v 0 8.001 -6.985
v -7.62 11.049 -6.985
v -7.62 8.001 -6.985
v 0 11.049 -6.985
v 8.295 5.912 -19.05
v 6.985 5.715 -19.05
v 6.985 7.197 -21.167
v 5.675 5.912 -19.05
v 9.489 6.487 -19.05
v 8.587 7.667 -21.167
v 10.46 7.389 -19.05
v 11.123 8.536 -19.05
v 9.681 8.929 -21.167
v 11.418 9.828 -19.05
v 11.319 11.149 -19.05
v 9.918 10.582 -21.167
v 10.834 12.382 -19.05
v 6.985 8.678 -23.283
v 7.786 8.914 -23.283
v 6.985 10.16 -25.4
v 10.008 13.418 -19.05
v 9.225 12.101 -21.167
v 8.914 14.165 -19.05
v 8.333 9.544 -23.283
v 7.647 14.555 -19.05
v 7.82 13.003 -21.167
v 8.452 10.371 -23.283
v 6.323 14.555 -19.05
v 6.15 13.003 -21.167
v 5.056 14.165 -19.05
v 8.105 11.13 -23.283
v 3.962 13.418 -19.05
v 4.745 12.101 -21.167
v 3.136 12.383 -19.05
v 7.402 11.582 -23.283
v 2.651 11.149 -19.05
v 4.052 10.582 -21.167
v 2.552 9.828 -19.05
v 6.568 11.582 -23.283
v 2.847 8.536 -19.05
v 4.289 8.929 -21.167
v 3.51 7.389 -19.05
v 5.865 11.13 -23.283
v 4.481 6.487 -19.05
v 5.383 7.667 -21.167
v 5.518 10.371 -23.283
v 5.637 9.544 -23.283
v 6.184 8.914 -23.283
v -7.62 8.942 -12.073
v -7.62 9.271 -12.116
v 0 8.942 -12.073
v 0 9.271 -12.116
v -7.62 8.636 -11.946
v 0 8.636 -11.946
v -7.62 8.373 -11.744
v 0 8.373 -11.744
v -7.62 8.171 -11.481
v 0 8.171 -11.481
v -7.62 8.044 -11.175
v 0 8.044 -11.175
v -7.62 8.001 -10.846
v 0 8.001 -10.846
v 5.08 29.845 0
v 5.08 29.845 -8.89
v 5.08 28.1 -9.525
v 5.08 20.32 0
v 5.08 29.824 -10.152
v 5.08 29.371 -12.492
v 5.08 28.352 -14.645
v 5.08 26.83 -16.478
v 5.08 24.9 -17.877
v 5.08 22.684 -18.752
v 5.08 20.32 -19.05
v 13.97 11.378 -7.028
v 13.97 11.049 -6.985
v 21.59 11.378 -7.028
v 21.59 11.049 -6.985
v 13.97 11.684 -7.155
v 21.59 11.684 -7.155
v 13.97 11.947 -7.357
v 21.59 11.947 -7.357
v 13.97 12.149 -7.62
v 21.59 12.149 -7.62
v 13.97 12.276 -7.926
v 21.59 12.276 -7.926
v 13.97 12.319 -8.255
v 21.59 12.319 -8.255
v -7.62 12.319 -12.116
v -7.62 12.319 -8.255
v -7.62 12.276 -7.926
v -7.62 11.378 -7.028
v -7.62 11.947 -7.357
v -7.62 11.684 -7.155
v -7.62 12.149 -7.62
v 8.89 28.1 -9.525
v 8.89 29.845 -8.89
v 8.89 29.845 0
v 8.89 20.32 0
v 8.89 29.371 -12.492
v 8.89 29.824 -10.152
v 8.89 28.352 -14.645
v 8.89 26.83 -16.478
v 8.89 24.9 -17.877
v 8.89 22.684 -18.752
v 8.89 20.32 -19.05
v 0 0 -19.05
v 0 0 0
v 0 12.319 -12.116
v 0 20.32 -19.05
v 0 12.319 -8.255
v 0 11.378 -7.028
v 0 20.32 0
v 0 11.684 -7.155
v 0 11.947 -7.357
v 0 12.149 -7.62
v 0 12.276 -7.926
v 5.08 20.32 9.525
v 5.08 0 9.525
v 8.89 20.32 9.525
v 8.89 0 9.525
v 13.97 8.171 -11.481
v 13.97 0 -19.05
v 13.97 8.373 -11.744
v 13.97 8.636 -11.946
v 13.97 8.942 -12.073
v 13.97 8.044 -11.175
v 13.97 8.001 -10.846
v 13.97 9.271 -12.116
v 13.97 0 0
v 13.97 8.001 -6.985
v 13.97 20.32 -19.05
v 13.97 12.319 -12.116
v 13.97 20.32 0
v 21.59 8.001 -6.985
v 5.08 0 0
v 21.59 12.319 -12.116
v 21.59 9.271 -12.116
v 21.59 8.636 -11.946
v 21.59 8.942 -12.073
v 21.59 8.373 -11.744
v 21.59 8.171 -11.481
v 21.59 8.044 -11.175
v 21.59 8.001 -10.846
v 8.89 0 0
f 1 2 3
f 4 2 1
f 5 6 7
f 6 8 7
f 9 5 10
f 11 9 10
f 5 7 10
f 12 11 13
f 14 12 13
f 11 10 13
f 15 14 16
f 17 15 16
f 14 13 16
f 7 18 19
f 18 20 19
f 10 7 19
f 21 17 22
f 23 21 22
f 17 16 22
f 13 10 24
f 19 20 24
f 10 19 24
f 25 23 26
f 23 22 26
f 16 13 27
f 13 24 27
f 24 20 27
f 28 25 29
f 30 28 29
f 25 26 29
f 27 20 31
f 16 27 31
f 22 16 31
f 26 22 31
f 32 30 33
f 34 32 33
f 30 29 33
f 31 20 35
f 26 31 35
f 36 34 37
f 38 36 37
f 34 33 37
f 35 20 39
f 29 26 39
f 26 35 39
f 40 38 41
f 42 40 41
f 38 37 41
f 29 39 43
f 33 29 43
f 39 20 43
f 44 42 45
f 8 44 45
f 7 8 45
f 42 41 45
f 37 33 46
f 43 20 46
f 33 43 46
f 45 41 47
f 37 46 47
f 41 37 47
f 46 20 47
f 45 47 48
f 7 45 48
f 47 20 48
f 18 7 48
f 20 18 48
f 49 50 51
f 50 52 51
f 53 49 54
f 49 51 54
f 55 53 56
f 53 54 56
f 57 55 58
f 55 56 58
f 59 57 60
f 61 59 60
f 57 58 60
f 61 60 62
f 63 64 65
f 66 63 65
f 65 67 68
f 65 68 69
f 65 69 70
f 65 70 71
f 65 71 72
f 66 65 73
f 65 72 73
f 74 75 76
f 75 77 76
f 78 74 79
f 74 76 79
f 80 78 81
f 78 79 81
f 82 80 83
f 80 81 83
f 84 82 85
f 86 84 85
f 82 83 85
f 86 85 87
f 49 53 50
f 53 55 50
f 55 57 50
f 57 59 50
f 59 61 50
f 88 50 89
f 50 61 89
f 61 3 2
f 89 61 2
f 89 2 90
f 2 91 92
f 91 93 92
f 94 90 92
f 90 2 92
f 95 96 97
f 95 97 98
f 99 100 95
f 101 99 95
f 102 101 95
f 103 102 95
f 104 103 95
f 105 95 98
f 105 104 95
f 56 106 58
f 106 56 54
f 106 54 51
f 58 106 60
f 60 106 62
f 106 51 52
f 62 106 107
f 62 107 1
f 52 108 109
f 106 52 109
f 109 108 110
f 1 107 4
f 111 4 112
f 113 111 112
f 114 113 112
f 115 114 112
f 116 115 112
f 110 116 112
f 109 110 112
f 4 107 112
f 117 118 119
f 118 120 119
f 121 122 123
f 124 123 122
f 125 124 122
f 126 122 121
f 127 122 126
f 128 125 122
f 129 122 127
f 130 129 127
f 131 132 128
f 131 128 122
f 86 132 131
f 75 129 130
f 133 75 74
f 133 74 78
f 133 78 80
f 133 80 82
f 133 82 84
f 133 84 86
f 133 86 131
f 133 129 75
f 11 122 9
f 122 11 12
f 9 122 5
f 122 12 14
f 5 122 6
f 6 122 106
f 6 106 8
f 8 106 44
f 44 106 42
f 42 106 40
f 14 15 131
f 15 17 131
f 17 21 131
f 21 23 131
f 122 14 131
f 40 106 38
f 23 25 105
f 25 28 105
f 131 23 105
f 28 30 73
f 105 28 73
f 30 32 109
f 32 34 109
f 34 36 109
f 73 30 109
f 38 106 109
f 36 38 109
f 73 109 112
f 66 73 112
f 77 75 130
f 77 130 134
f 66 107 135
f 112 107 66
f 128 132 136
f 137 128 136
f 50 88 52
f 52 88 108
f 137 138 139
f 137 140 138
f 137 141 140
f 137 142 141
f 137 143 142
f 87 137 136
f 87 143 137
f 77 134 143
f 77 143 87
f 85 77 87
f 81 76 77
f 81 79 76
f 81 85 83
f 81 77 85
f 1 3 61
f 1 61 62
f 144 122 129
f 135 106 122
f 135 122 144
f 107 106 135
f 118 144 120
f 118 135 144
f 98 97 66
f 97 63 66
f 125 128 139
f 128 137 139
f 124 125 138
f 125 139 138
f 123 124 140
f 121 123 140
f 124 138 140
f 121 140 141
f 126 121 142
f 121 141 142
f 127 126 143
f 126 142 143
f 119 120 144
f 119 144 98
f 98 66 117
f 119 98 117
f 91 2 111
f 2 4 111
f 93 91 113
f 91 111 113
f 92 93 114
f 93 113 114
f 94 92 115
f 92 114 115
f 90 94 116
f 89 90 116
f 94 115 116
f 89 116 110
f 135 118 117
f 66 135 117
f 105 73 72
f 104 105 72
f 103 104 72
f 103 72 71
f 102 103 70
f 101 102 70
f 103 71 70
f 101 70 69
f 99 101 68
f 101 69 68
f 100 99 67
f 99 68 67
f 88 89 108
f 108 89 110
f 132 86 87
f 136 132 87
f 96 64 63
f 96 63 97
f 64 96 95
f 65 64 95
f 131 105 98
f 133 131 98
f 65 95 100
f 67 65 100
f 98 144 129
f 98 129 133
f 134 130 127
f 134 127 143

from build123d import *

# Parameters (mm, degrees)
F0_W      = 20.32
F0_H      = 19.05
F1_DEPTH  = 13.97
F3_START  = -6.985
F2_W      = 29.21
F2_H      = 4.318
F3_DEPTH  = 5.1308
F7_W      = 20.32
F7_H      = 9.525
F8_DEPTH  = 1.905
F9_DEPTH  = 9.525
F10_R     = 1.27
F12_DEPTH = 25.4


with BuildPart() as f1:
    # F0 (on Right) → F1 (new body)
    with BuildSketch(Plane.YZ):
        with Locations((10.16, -9.525)):
            Rectangle(F0_W, F0_H)
    extrude(amount=F1_DEPTH)

    # F2 (on face) → F3 (join)
    with BuildSketch(Plane.XY.offset(F3_START)):
        with Locations((6.985, 10.16)):
            Rectangle(F2_W, F2_H)
    extrude(amount=-F3_DEPTH)

    # F5 (on offset) → F6 (revolve)
    with BuildSketch(Plane.YZ.offset(6.985)):
        Polygon((10.16, -19.05), (5.715, -19.05), (10.16, -25.4), align=None)
    revolve(axis=Axis((6.985, 10.16, -22.225), (0, 0, 1)))

    # F7 (on offset) → F8 (join, symmetric)
    with BuildSketch(Plane.YZ.offset(6.985)):
        with BuildLine():
            ThreePointArc((20.32, -19.05), (27.0551920908, -16.2601920908), (29.845, -9.525))
            Line((29.845, -9.525), (20.32, -9.525))
            Line((20.32, -9.525), (20.32, -19.05))
        make_face()
        with Locations((10.16, 4.7625)):
            Rectangle(F7_W, F7_H)
    extrude(amount=F8_DEPTH, both=True)

    # F9 (add, through all): a face of the model
    f9_faces = [f1.faces().sort_by_distance(p)[0] for p in [
        (6.985, 25.0825, -9.525),
    ]]
    extrude(f9_faces, amount=F9_DEPTH)

    # F10
    f10_edges = [f1.edges().sort_by_distance(p)[0] for p in [
        (17.78, 8.001, -12.1158),
        (17.78, 12.319, -6.985),
        (-3.81, 8.001, -12.1158),
        (-3.81, 12.319, -6.985),
    ]]
    fillet(f10_edges, radius=F10_R)

    # F11 (on offset) → F12 (cut, symmetric)
    with BuildSketch(Plane.YZ.offset(6.985)):
        Polygon((29.845, -10.16), (29.845, -8.89), (28.1003518386, -9.525), align=None)
    extrude(amount=F12_DEPTH, both=True, mode=Mode.SUBTRACT)


solid = f1.part
